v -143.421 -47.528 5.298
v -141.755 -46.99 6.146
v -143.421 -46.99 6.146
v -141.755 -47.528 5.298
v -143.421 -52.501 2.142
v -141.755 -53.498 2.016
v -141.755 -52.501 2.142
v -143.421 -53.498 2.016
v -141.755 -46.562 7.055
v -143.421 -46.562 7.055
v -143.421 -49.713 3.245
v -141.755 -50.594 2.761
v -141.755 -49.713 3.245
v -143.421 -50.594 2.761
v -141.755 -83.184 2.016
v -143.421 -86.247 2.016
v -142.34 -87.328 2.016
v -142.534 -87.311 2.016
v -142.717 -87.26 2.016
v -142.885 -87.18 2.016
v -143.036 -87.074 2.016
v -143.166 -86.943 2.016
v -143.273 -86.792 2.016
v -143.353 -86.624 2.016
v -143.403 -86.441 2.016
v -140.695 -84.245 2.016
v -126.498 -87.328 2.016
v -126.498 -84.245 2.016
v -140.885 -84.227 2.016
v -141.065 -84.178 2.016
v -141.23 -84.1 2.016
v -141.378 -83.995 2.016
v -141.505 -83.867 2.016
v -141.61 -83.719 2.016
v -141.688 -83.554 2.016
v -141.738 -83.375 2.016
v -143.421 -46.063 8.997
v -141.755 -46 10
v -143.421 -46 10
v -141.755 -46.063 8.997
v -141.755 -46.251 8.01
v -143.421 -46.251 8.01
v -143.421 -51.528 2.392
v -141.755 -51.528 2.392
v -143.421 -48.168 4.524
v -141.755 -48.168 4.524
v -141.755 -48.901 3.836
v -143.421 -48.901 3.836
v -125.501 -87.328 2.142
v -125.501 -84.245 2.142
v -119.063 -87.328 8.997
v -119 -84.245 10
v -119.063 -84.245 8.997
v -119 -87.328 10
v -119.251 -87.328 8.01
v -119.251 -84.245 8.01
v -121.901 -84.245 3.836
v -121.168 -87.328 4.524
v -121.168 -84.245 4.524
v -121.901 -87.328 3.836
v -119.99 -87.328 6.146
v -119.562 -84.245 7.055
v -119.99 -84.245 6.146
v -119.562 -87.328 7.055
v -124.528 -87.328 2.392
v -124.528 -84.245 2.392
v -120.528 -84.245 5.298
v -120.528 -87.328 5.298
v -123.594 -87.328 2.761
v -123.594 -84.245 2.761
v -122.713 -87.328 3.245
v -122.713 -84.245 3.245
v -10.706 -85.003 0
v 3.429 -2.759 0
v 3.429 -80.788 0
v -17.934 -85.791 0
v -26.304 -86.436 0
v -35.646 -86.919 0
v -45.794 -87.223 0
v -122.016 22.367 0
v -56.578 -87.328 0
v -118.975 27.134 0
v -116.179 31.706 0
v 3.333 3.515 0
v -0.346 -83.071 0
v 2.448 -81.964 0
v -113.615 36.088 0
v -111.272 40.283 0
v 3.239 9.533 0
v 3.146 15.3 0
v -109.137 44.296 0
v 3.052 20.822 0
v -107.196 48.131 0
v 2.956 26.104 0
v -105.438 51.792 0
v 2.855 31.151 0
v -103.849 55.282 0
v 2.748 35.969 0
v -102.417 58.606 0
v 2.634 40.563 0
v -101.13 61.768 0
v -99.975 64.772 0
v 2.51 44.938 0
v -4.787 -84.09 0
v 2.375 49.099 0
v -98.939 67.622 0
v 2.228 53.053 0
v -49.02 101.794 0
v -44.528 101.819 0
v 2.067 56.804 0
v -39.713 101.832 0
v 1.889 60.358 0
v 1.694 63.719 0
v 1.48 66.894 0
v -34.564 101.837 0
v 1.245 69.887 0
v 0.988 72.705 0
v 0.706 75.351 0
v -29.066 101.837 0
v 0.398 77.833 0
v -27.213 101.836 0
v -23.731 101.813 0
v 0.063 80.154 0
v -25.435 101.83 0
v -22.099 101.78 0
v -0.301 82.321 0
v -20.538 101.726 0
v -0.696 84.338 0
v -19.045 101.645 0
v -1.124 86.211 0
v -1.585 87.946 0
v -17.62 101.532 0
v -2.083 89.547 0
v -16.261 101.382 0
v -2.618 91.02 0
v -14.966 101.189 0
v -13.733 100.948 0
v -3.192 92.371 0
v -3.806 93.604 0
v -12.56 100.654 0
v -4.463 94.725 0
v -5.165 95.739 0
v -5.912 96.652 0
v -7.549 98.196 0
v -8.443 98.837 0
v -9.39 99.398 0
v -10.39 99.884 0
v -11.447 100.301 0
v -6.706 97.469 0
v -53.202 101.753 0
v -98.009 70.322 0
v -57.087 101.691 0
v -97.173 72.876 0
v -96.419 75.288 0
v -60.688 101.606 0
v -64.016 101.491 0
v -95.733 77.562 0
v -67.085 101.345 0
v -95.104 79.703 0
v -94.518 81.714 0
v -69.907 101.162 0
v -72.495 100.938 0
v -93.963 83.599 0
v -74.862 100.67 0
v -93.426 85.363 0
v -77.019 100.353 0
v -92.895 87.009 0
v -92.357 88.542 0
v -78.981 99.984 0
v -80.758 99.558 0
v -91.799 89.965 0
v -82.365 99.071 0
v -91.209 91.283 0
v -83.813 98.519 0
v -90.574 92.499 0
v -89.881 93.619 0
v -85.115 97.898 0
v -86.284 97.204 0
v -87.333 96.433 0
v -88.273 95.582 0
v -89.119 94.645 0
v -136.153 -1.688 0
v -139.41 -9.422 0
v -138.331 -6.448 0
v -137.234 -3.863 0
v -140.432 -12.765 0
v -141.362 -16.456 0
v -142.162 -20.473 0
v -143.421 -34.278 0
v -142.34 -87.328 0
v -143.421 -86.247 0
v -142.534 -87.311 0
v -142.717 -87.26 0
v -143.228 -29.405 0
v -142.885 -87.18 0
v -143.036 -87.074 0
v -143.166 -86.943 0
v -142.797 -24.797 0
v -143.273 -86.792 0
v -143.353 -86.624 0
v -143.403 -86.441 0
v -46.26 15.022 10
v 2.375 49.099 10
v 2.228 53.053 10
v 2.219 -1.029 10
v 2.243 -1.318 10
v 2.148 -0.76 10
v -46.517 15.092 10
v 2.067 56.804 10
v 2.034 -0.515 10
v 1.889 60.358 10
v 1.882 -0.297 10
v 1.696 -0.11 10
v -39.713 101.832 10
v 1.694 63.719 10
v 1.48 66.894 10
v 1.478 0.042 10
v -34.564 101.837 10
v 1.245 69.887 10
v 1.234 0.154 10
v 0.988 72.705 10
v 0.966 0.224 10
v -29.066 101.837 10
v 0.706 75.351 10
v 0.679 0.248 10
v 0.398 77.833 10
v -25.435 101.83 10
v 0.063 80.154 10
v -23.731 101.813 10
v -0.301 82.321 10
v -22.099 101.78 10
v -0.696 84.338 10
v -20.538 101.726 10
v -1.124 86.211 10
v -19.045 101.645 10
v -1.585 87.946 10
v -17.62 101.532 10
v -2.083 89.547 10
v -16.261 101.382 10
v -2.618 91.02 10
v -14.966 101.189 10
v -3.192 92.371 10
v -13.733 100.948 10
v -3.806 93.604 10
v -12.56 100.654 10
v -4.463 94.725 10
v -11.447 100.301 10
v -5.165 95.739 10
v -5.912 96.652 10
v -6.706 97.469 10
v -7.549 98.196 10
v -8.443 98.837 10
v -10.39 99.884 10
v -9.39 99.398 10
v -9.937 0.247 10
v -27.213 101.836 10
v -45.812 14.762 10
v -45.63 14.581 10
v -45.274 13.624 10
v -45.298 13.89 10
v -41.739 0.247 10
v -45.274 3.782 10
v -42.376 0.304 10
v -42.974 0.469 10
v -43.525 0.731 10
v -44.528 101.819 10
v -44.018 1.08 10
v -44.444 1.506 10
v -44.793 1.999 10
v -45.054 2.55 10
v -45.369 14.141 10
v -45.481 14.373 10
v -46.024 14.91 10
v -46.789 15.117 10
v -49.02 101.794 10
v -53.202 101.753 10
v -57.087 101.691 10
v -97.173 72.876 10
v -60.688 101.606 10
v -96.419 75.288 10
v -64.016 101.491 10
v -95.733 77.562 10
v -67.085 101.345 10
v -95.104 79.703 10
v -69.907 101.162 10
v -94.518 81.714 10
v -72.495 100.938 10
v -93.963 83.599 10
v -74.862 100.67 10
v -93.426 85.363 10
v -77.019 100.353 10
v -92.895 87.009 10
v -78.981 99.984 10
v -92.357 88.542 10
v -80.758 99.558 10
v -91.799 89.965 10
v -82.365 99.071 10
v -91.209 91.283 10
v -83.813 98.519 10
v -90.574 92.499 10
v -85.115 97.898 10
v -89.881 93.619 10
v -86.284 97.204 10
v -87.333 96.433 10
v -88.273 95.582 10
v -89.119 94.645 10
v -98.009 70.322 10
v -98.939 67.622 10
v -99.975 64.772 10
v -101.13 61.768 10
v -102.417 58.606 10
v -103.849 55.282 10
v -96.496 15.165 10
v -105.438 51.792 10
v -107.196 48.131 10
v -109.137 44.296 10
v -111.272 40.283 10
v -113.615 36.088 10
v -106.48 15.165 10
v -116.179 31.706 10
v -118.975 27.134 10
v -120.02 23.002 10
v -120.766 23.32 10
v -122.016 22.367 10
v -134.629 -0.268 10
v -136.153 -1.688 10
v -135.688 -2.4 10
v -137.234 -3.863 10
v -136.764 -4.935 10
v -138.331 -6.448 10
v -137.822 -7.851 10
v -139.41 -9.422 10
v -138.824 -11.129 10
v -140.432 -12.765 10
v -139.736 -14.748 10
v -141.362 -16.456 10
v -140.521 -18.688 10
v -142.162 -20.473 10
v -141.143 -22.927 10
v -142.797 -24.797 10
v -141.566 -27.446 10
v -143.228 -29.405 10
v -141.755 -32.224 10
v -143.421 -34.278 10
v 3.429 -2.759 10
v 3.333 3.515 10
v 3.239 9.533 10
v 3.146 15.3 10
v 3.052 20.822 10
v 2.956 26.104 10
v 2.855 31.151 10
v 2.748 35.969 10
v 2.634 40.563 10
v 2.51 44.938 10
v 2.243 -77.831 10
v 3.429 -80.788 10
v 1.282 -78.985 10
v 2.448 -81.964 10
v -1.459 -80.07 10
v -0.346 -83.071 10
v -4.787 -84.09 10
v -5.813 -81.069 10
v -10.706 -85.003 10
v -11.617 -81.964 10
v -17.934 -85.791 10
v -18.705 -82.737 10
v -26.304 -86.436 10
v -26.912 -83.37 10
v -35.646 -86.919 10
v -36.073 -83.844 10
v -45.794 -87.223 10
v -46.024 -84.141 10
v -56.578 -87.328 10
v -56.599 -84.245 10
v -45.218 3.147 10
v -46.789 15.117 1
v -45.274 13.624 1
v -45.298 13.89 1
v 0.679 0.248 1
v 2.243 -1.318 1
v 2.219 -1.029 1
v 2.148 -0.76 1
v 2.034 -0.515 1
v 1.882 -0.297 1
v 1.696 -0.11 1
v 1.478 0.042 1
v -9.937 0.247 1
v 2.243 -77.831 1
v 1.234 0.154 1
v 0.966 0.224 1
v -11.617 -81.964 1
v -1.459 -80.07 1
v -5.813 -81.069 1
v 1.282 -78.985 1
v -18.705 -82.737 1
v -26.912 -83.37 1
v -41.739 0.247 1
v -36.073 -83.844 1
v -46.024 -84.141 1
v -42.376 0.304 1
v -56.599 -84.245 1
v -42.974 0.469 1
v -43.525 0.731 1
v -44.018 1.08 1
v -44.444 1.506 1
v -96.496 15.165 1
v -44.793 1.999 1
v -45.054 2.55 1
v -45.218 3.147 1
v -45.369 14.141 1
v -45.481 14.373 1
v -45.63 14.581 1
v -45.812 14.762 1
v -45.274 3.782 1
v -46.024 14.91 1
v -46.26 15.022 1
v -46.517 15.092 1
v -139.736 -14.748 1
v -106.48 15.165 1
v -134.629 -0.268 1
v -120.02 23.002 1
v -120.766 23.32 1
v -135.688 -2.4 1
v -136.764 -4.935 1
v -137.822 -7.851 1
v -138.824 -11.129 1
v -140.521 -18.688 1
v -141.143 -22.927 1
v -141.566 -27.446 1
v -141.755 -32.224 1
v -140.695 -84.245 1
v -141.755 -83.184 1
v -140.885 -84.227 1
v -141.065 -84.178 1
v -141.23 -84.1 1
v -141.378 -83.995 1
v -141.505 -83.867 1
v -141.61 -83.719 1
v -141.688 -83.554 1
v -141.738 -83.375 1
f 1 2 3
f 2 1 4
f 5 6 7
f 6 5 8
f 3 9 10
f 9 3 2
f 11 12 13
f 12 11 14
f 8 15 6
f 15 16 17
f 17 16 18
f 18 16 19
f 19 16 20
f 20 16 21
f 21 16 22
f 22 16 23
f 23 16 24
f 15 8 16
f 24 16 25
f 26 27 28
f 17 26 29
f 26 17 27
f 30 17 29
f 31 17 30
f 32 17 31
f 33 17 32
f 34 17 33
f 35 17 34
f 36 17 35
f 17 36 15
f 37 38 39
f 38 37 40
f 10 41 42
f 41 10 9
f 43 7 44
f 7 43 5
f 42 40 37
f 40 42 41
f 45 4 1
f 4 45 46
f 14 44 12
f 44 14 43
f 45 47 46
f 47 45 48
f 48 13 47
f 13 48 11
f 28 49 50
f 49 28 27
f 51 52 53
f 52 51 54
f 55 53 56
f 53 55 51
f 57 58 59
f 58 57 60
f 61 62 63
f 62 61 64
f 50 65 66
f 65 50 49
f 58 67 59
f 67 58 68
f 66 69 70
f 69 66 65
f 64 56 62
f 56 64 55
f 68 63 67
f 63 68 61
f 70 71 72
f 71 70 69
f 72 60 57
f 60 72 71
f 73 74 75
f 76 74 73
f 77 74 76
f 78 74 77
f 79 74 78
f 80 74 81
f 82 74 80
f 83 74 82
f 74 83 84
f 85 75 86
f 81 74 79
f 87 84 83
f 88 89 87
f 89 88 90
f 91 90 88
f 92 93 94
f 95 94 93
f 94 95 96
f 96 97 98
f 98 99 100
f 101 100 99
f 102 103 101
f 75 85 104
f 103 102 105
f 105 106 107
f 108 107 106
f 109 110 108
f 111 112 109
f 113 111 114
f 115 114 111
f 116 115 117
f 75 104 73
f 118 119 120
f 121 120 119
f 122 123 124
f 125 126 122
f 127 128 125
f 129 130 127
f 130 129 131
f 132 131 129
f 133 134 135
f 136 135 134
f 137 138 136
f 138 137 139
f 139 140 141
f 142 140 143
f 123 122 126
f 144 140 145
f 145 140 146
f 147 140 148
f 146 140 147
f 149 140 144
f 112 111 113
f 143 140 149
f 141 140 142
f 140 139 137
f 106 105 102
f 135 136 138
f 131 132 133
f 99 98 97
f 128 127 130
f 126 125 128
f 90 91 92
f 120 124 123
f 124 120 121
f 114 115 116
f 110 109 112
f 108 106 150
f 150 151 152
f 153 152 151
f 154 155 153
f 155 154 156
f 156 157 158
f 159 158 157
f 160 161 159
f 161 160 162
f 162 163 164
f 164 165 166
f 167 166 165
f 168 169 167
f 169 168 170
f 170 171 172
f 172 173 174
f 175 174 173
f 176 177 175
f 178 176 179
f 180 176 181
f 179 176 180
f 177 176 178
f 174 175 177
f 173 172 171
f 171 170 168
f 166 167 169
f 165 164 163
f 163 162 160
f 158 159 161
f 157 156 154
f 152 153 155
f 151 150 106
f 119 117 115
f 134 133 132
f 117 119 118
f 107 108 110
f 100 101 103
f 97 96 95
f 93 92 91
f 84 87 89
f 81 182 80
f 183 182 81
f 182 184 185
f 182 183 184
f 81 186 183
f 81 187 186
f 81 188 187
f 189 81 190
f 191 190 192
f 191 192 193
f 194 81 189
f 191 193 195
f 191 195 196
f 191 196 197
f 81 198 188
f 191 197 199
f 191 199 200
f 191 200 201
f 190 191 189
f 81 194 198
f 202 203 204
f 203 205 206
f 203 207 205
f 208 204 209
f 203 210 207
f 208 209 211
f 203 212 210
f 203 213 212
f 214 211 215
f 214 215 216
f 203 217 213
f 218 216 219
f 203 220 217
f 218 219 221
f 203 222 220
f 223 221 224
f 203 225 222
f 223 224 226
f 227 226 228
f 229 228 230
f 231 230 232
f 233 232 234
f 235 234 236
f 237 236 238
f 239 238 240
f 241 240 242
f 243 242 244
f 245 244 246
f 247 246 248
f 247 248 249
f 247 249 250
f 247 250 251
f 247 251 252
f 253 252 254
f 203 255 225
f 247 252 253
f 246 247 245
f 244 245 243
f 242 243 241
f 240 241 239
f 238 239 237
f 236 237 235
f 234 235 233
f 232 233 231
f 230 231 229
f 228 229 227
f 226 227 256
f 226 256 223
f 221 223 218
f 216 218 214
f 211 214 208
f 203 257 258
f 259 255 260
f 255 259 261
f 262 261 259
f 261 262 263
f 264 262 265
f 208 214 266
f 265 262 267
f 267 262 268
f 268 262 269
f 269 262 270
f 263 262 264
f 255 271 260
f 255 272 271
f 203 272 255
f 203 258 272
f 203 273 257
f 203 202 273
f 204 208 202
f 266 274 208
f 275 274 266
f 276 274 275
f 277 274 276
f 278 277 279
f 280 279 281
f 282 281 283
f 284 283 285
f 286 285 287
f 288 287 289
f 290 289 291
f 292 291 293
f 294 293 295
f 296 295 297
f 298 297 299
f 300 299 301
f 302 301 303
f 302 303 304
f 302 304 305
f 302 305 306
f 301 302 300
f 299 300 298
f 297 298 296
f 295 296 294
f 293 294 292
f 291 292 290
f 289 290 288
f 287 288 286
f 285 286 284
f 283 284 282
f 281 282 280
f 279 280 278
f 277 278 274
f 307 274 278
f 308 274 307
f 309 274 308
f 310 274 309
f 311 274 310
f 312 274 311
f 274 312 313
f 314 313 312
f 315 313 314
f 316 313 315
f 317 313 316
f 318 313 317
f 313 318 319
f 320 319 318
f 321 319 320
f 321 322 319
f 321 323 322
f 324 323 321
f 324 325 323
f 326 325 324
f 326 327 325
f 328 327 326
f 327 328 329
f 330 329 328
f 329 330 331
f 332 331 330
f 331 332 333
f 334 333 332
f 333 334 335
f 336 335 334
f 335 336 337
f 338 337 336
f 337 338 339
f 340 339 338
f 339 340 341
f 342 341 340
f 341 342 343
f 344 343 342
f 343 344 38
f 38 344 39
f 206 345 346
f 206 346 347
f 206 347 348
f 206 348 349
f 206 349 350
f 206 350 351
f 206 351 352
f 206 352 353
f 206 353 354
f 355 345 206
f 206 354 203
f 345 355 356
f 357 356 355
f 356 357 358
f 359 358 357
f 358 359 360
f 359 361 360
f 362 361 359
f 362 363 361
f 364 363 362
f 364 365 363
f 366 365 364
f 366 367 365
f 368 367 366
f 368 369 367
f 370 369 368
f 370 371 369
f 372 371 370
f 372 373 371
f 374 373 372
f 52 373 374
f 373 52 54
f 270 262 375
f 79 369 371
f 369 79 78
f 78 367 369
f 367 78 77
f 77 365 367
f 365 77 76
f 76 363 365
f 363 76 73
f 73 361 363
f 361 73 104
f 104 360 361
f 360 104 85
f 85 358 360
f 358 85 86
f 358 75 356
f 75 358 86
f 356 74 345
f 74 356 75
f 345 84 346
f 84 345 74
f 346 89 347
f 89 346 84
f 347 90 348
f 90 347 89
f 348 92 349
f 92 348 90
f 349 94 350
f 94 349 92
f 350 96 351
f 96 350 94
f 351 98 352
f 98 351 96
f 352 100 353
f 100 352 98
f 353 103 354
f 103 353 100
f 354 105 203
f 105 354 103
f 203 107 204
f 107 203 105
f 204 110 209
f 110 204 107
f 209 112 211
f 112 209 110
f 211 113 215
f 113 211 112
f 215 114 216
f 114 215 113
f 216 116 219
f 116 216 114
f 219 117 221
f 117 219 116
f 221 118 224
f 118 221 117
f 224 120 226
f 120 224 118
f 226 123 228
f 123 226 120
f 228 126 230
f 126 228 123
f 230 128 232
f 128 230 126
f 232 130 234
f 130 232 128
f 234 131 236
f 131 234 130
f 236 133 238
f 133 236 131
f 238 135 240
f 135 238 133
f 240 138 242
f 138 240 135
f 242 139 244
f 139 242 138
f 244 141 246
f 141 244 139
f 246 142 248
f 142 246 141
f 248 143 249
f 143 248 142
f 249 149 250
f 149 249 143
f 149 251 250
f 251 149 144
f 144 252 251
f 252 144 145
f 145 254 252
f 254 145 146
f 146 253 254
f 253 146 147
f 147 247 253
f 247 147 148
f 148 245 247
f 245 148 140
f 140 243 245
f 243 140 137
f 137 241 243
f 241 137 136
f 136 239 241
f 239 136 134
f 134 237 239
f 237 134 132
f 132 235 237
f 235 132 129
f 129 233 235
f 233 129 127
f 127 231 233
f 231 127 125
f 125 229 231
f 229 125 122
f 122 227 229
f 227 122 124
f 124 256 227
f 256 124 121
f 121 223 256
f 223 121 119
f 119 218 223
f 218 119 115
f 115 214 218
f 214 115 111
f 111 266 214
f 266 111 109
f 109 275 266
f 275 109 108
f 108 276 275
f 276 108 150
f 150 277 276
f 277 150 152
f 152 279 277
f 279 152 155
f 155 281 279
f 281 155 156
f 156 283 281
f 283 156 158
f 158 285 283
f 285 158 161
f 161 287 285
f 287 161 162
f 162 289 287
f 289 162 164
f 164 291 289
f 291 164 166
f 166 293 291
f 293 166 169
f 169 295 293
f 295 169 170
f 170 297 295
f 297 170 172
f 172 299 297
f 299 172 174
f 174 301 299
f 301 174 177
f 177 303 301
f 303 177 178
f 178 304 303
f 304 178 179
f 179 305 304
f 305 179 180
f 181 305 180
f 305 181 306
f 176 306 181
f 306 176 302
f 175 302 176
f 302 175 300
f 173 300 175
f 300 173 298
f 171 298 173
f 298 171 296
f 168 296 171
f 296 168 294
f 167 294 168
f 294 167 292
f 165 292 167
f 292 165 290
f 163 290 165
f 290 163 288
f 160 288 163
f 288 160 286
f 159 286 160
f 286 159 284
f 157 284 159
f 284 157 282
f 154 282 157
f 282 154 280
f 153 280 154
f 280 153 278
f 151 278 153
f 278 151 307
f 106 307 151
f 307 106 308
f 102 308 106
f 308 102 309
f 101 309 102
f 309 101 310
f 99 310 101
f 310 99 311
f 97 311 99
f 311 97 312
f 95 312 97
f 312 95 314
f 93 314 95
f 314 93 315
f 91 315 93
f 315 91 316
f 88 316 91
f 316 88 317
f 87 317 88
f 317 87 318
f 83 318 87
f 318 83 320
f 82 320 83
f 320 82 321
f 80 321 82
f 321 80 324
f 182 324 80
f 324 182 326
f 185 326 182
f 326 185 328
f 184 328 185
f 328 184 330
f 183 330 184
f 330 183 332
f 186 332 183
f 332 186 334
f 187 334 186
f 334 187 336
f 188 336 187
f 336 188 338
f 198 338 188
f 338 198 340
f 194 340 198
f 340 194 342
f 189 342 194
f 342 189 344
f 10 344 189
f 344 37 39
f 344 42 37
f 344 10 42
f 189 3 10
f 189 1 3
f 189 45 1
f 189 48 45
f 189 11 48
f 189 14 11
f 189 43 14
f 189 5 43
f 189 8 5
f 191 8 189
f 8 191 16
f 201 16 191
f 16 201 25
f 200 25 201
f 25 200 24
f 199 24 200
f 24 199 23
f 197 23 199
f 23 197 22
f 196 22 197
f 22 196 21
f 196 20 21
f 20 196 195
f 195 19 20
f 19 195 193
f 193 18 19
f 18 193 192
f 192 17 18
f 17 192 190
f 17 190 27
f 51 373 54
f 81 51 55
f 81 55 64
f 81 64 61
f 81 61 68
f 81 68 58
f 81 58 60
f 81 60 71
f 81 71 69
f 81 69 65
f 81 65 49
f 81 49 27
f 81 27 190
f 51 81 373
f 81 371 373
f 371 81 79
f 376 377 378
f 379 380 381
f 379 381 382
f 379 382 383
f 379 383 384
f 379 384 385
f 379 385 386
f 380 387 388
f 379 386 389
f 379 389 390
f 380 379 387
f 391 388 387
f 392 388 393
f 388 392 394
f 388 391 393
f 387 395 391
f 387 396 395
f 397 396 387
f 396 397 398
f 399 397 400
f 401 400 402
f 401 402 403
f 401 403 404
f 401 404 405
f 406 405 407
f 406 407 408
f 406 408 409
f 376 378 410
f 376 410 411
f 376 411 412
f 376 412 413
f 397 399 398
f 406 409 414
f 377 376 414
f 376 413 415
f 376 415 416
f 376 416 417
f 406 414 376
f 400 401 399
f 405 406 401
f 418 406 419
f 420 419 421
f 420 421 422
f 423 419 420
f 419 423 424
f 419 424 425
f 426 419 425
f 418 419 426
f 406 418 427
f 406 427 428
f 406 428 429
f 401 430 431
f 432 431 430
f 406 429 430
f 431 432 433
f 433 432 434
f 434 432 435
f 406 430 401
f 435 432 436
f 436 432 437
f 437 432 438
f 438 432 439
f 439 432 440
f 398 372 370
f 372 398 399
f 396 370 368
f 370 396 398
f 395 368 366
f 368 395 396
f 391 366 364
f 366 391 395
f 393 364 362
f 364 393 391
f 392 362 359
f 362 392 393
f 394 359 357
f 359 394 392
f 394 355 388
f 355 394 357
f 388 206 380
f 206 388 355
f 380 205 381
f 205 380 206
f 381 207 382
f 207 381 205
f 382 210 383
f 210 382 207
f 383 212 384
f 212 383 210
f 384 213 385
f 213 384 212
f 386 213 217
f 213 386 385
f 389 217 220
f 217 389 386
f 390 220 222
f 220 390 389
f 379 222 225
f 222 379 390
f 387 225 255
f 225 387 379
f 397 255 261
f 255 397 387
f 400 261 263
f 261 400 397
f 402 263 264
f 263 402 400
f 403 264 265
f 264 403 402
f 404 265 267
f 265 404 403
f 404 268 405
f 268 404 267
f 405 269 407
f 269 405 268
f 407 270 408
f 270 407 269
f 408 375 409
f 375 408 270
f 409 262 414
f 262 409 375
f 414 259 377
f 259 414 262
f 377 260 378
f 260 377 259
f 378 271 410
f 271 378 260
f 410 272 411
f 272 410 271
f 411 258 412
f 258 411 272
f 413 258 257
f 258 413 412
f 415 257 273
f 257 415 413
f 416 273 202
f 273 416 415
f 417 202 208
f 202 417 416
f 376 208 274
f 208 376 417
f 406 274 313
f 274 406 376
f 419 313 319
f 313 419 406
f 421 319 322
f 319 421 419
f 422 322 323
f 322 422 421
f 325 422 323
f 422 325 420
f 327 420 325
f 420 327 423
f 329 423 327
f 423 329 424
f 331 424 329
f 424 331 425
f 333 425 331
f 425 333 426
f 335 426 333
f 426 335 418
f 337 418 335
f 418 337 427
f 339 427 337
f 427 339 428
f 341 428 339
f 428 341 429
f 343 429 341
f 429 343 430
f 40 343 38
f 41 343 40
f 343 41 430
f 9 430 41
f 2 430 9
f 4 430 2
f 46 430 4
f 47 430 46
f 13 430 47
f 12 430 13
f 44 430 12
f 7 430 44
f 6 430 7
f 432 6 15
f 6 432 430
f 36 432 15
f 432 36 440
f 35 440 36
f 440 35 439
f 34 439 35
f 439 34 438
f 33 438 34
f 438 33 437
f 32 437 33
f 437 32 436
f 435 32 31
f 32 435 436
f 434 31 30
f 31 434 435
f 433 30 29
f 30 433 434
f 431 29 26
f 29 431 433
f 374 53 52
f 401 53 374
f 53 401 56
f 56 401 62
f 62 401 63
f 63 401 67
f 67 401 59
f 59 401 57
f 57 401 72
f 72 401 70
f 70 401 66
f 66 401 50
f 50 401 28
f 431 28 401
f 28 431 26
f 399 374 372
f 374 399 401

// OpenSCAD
// file: ../bezier.scad
function mix(p1, p2, t) = [p1[0] * (1 - t) + p2[0] * t, p1[1] * (1 - t) + p2[1] * t];

function bezier_point(p, t) =
    let (
        a = mix(p[0], p[1], t),
        b = mix(p[1], p[2], t),
        c = mix(p[2], p[3], t),
        d = mix(a, b, t),
        e = mix(b, c, t)
    )
    mix(d, e, t);

function bezier_points(p, N) = [
    for (i = [0 : N - 1]) bezier_point(p, i / (N - 1))
];
// file: ../profiles.scad
include <array_ops.scad>
include <bezier.scad>

n_corner_points = 10;

board_profile_points = concat(
    [[-119.504642, 22.529083], [-106.09824, 14.768994],
        [-106.09824, 14.768994], [-96.213288, 14.768994],
        [-96.213288, 14.768994], [-46.99839, 14.721548]],
bezier_points(
    [[-46.99839, 14.721548], [-46.16894, 14.721172], [-45.497997, 14.049582], [-
45.498384, 13.243936]], n_corner_points),
    [[-45.498384, 13.243936], [-45.498384, 3.499618]],
bezier_points(
    [[-45.498384, 3.499618], [-45.499493, 1.567921], [-43.9343, 0.00093], [-41.998735, -
0.000898]],
n_corner_points),
    [[-41.998735, -0.000898], [-10.510735, -0.000898],
        [-10.510735, -0.000898], [0, 0]],
bezier_points(
    [[0, 0], [0.876629, 0.003368], [1.548207, -0.667575], [1.548595, -1.550011]],
n_corner_points),
    [[1.548595, -1.550011], [1.548595, -77.305898]],
bezier_points(
    [[1.548595, -77.305898], [1.498595, -80.815755], [-24.536412, -83.655898], [-
56.710735, -83.655898]], n_corner_points),
    [[-56.710735, -83.655898], [-114.910735, -83.655898],
        [-114.910735, -83.655898], [-139.974397, -83.655898]],
bezier_points(
    [[-139.974397, -83.655898], [-140.553969, -83.655567], [-141.023536, -83.185462], [-
141.023875, -82.60589]], n_corner_points),
    [[-141.023875, -82.60589], [-141.023875, -32.15045]],
bezier_points(
    [[-141.023875, -32.15045], [-140.847733, -17.594028], [-137.053996, -6.226473], [-
133.968073, -0.510408]], n_corner_points),
    [[-133.968073, -0.510408], [-120.242566, 22.844102]]
);

wrist_support_top_points = concat(
    [[-119.504642, 22.529083], [-106.09824, 14.768994],
        [-106.09824, 14.768994], [-96.213288, 14.768994],
        [-96.213288, 14.768994], [-46.99839, 14.721548]],
bezier_points(
    [[-46.99839, 14.721548], [-46.16894, 14.721172], [-45.497997, 14.049582], [-
45.498384, 13.243936]], n_corner_points),
    [[-45.498384, 13.243936], [-45.498384, 3.499618]],
bezier_points(
    [[-45.498384, 3.499618], [-45.499493, 1.567921], [-43.9343, 0.00093], [-41.998735, -
0.000898]],
n_corner_points),
    [[-41.998735, -0.000898], [-10.510735, -0.000898],
        [-10.510735, -0.000898], [0, 0]],
bezier_points(
    [[0, 0], [0.876629, 0.003368], [1.548207, -0.667575], [1.548595, -1.550011]],
n_corner_points
)
);

board_top_points = concat(
    [[1.548595, -1.550011], [1.548595, -77.305898]],
bezier_points(
    [[1.548595, -77.305898], [1.498595, -80.815755], [-24.536412, -83.655898], [-
56.710735, -83.655898]], n_corner_points),
    [[-56.710735, -83.655898], [-114.910735, -83.655898],
        [-114.910735, -83.655898], [-139.974397, -83.655898]],
bezier_points(
    [[-139.974397, -83.655898], [-140.553969, -83.655567], [-141.023536, -83.185462], [-
141.023875, -82.60589]], n_corner_points),
    [[-141.023875, -82.60589], [-141.023875, -32.15045]],
bezier_points(
    [[-141.023875, -32.15045], [-140.847733, -17.594028], [-137.053996, -6.226473], [-
133.968073, -0.510408]], n_corner_points),
    [[-133.968073, -0.510408], [-120.242566, 22.844102]]
);

wrist_support_bottom_points = concat(
bezier_points(
    [
        [-120.242566, 22.844102],
        [-70, 100],
        [-120, 100],
        [-30, 100]
    ], n_corner_points * 5),
bezier_points(
    [
        [-30, 100],
        [0, 100],
        [0, 100],
        [1.548595, -1.550011]
    ], n_corner_points * 5)
);

case_profile_points = concat(
board_top_points,
wrist_support_bottom_points
);
// file: ../array_ops.scad
function reverse(arr) = [
    for (i = [1:len(arr)]) arr[len(arr) - i]
    ];

function translate2d(arr, tr) = [
    for (point = arr) [point[0] + tr[0], point[1] + tr[1]]
    ];

function scale2d(arr, factor, centerpoint) = [
    for (point = arr) [
                (point[0] - centerpoint[0]) * factor + centerpoint[0],
                (point[1] - centerpoint[1]) * factor + centerpoint[1],
        ]
    ];

function scale2d_multi(arr, factors, centerpoint) = [
    for (point = arr) [
                (point[0] - centerpoint[0]) * factors[0] + centerpoint[0],
                (point[1] - centerpoint[1]) * factors[1] + centerpoint[1],
        ]
    ];

function sum(v) = [for (p = v) 1] * v;

function get_center_point(points) =
    [
        sum([for (p = points) p[0]]) / len(points),
        sum([for (p = points) p[1]]) / len(points),
    ];
// file: ../config.scad
rotation = [10, 10, 170];
translation = [-160, 0, 25];
choc_scale = [0.95315, 0.91];
// file: ../stand.scad
include <profiles.scad>

module base_volume(profile_points, outer_scale_margin, rotation, translation) {
    center_point = get_center_point(profile_points);
    linear_extrude(height = 120)
        projection(cut = false)
            translate(translation)
                rotate(rotation)
                    linear_extrude(height = 0.1)
                        translate([center_point[0], center_point[1], 0])
                            scale([1 + outer_scale_margin, 1 + outer_scale_margin, 1])
                                translate([-center_point[0], -center_point[1], 0])
                                    polygon(profile_points);
};


module keyboard_base(profile_points, outer_scale_margin, rotation, translation) {
    difference() {
        base_volume(
        profile_points = profile_points,
        outer_scale_margin = outer_scale_margin + 0.02,
        rotation = rotation,
        translation = translation
        );
        translate([0, 0, -0.1])
            base_volume(
            profile_points = profile_points,
            outer_scale_margin = outer_scale_margin - 0.03,
            rotation = rotation,
            translation = translation
            );

        translate(translation)
            rotate(rotation)
                translate([-500, -500, 5])
                    cube([1000, 1000, 1000]);

        translate(translation)
            rotate(rotation)
                keyboard_body(profile_points, 100, outer_scale_margin);

        translate(translation)
            rotate(rotation)
                case_holes(rad_extra = 0.1);
    };
};
// file: ../housing.scad
include <array_ops.scad>
include <profiles.scad>

$fn = 50;
outer_scale_margin = 0.03;

module board_with_thickenss(points) {
    linear_extrude(height = 2)
        polygon(points);
};

module keyboard_space(
profile_points,
bottom_thickenss,
case_height,
scale_margin,
eps = 0.01
) {
    center_point = get_center_point(profile_points);
    translate([0, 0, bottom_thickenss])
        linear_extrude(height = case_height - bottom_thickenss + eps)
            translate([center_point[0], center_point[1], 0])
                scale([1 + scale_margin, 1 + scale_margin, 1])
                    translate([-center_point[0], -center_point[1], 0])
                        polygon(profile_points);
};

module keyboard_body(profile_points, case_height, scale_margin) {
    center_point = get_center_point(profile_points);
    linear_extrude(height = case_height)
        translate([center_point[0], center_point[1], 0])
            scale([1 + scale_margin, 1 + scale_margin, 1])
                translate([-center_point[0], -center_point[1], 0])
                    polygon(profile_points);
};

function scale_wrist_support_points(
top_points, bottom_points, outer_scale, board_scale, case_center, board_center
) = concat(
scale2d(bottom_points, outer_scale, case_center),
scale2d(top_points, board_scale, board_center)
);

module case_hole(hole_height, hole_rad, hull_length) {
    linear_extrude(hole_height)
        hull() {
            translate([hull_length, 0, 0])
                circle(r = hole_rad);
            circle(r = hole_rad);
        };
};

module case_holes(rad_extra = 0) {
    hole_height = 10;
    hole_rad = 8 + rad_extra;
    hull_length = 18;
    translate([-148, -90, 10])
        rotate([90, 00, 90])
            case_hole(
            hole_height = hole_height,
            hole_rad = hole_rad,
            hull_length = hull_length * 2
            );
    translate([-145, -80, 10])
        rotate([90, 00, 0])
            case_hole(
            hole_height = hole_height,
            hole_rad = hole_rad,
            hull_length = hull_length
            );
};

module case(board_points, case_points) {
    case_height = 10;
    keyboard_hole_scale_margin = 0.01;
    bottom_thickenss = 1;
    * case_holes();
    difference() {
        keyboard_body(
        profile_points = case_points,
        case_height = case_height,
        scale_margin = outer_scale_margin
        );
        keyboard_space(
        profile_points = board_points,
        bottom_thickenss = bottom_thickenss,
        case_height = case_height,
        scale_margin = keyboard_hole_scale_margin
        );
        case_holes();
    };
};

module wrist_support(
top_points, bottom_points, outer_scale, board_scale, case_center, board_center
) {
    height = 1;
    board_height = 10;
    inset = 0.99;

    wrist_support_points_outer = scale_wrist_support_points(
    top_points,
    bottom_points,
    outer_scale,
    board_scale,
    case_center,
    board_center
    );
    translate([0, 0, board_height])
        linear_extrude(height)
            polygon(wrist_support_points_outer);
};
// main file
include <../housing.scad>
include <../stand.scad>
include <../config.scad>

case(
board_points = board_profile_points,
case_points = case_profile_points
);
